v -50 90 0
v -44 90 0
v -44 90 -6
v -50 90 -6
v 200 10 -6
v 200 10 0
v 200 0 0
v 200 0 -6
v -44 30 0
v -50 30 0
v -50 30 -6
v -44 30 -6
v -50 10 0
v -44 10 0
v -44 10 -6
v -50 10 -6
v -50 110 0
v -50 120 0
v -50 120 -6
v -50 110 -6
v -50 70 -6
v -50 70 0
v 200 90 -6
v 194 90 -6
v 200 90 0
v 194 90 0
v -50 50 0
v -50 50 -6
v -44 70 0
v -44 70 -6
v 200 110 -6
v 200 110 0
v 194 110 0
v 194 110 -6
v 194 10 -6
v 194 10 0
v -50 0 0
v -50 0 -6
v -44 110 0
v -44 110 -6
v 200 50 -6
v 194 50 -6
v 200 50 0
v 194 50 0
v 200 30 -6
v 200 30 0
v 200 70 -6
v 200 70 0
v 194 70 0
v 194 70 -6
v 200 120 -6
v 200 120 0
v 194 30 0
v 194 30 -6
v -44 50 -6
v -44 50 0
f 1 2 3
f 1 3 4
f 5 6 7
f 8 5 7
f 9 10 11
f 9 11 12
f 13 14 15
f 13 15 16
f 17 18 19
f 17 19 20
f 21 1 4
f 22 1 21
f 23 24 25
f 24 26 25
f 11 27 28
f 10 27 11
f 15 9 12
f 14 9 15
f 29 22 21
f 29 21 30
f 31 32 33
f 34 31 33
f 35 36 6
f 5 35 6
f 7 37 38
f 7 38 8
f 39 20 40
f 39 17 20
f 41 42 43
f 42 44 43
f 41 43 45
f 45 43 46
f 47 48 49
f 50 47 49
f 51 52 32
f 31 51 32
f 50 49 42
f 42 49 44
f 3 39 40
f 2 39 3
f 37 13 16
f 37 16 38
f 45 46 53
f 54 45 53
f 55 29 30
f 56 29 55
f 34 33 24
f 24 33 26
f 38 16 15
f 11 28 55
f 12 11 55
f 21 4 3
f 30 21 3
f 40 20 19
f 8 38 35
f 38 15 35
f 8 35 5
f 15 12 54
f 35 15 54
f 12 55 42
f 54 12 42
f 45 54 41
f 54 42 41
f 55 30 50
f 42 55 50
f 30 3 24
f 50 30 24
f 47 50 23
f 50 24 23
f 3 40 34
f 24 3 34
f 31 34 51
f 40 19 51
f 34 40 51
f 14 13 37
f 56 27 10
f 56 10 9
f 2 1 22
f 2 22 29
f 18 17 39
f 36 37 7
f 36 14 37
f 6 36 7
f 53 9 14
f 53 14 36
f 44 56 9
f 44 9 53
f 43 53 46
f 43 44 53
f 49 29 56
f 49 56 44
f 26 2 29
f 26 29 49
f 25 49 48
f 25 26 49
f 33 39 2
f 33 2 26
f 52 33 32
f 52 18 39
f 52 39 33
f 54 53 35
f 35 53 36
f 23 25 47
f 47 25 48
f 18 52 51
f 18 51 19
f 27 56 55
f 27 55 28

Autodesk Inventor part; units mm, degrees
ref_plane "YZ Plane" through (0, 0, 0) normal (1, 0, 0) x (0, 1, 0)
ref_plane "XZ Plane" through (0, 0, 0) normal (0, 1, 0) x (-1, 0, 0)
ref_plane "XY Plane" through (0, 0, 0) normal (0, 0, 1) x (1, 0, 0)
sketch "Sketch1" plane through (0, 0, 0) normal (0, 0, 1) x (1, 0, 0)
  line L0 (0, 0) -> (0, 120)
  circle A0 centre (80, 60) radius 50
  line L1 (0, 0) -> (150, 0)
  line L2 (150, 120) -> (0, 120)
  line L3 (0, 120) -> (0, 110)
  line L4 (0, 110) -> (5, 110)
  line L5 (5, 110) -> (5, 90)
  line L6 (5, 90) -> (0, 90)
  line L7 (0, 90) -> (0, 70)
  line L8 (0, 70) -> (5, 70)
  line L9 (5, 70) -> (5, 50)
  line L10 (5, 50) -> (0, 50)
  line L11 (0, 50) -> (0, 30)
  line L12 (0, 30) -> (5, 30)
  line L13 (5, 30) -> (5, 10)
  line L14 (5, 10) -> (0, 10)
  line L15 (0, 120) -> (-50, 120)
  line L16 (-50, 120) -> (-50, 110)
  line L17 (-50, 110) -> (-44, 110)
  line L18 (-44, 110) -> (-44, 90)
  line L19 (-44, 90) -> (-50, 90)
  line L20 (-50, 90) -> (-50, 70)
  line L21 (-50, 70) -> (-44, 70)
  line L22 (-44, 70) -> (-44, 50)
  line L23 (-44, 50) -> (-50, 50)
  line L24 (-50, 50) -> (-50, 30)
  line L25 (-50, 30) -> (-44, 30)
  line L26 (-44, 30) -> (-44, 10)
  line L27 (-44, 10) -> (-50, 10)
  line L28 (-50, 10) -> (-50, 0)
  line L29 (-50, 0) -> (0, 0)
  line L30 (150, 115) -> (145, 115)
  line L31 (145, 115) -> (145, 95)
  line L32 (150, 120) -> (200, 120)
  line L33 (200, 120) -> (200, 110)
  line L34 (200, 110) -> (194, 110)
  line L35 (194, 110) -> (194, 90)
  line L36 (194, 90) -> (200, 90)
  line L37 (200, 90) -> (200, 70)
  line L38 (200, 70) -> (194, 70)
  line L39 (194, 70) -> (194, 50)
  line L40 (194, 50) -> (200, 50)
  line L41 (200, 50) -> (200, 30)
  line L42 (200, 30) -> (194, 30)
  line L43 (194, 30) -> (194, 10)
  line L44 (194, 10) -> (200, 10)
  line L45 (200, 10) -> (200, 0)
  line L46 (200, 0) -> (150, 0)
  line L47 (150, 120) -> (150, 0)
  line L48 (145, 95) -> (150, 95)
  line L49 (150, 95) -> (150, 90)
  line L50 (150, 90) -> (145, 90)
  line L51 (145, 90) -> (145, 70)
  line L52 (145, 70) -> (150, 70)
  line L53 (0, 120) -> (0, 125)
  line L54 (150, 125) -> (150, 120)
  line L55 (0, 125) -> (10, 125)
  line L56 (10, 125) -> (10, 120)
  line L57 (10, 120) -> (30, 120)
  line L58 (30, 120) -> (30, 125)
  line L59 (30, 125) -> (50, 125)
  line L60 (50, 125) -> (50, 120)
  line L61 (50, 120) -> (70, 120)
  line L62 (70, 120) -> (70, 125)
  line L63 (70, 125) -> (90, 125)
  line L64 (90, 125) -> (90, 120)
  line L65 (90, 120) -> (110, 120)
  line L66 (110, 120) -> (110, 125)
  line L67 (110, 125) -> (130, 125)
  line L68 (130, 125) -> (130, 120)
  line L69 (130, 120) -> (140, 120)
  line L70 (140, 120) -> (140, 125)
  line L71 (140, 125) -> (150, 125)
  dimension "d12" = 100
  dimension "d13" = 120
  dimension "d14" = 150
  dimension "d17" = 80
  dimension "d18" = 60
  dimension "d19" = 10
  dimension "d20" = 5
  dimension "d21" = 20
  dimension "d22" = 20
  dimension "d23" = 5
  dimension "d24" = 20
  dimension "d25" = 20
  dimension "d26" = 20
  dimension "d38" = 50
  dimension "d39" = 10
  dimension "d40" = 6
  dimension "d41" = 5
  dimension "d42" = 5
  dimension "d43" = 50
  dimension "d44" = 6
  dimension "d45" = 5
  dimension "d46" = 20
  dimension "d47" = 20
  dimension "d48" = 5
  dimension "d51" = 10
  dimension "d52" = 20
  dimension "d53" = 20
  dimension "d54" = 20
  dimension "d55" = 20
  dimension "d56" = 20
  dimension "d57" = 20
  dimension "d58" = 10
extrude "Extrusion1" add sketch "Sketch1" against normal blind 6 contours L29 L28 L27 L26 L25 L24 L23 L22 L21 L20 L19 L18 L17 L16 L15 L0 | L0 L14 L13 L12 L10 L9 L8 L6 L5 L4 L2 L47 L30 L31 L48 L50 L51 L52 L1 | L0 L12 L13 L14 | L47 L32 L33 L34 L35 L36 L37 L38 L39 L40 L41 L42 L43 L44 L45 L46 | L52 L51 L50 L47 | L0 L8 L9 L10 | L48 L31 L30 L47 | L0 L4 L5 L6 | A0
properties part number "Archimedes Screw Border1"
